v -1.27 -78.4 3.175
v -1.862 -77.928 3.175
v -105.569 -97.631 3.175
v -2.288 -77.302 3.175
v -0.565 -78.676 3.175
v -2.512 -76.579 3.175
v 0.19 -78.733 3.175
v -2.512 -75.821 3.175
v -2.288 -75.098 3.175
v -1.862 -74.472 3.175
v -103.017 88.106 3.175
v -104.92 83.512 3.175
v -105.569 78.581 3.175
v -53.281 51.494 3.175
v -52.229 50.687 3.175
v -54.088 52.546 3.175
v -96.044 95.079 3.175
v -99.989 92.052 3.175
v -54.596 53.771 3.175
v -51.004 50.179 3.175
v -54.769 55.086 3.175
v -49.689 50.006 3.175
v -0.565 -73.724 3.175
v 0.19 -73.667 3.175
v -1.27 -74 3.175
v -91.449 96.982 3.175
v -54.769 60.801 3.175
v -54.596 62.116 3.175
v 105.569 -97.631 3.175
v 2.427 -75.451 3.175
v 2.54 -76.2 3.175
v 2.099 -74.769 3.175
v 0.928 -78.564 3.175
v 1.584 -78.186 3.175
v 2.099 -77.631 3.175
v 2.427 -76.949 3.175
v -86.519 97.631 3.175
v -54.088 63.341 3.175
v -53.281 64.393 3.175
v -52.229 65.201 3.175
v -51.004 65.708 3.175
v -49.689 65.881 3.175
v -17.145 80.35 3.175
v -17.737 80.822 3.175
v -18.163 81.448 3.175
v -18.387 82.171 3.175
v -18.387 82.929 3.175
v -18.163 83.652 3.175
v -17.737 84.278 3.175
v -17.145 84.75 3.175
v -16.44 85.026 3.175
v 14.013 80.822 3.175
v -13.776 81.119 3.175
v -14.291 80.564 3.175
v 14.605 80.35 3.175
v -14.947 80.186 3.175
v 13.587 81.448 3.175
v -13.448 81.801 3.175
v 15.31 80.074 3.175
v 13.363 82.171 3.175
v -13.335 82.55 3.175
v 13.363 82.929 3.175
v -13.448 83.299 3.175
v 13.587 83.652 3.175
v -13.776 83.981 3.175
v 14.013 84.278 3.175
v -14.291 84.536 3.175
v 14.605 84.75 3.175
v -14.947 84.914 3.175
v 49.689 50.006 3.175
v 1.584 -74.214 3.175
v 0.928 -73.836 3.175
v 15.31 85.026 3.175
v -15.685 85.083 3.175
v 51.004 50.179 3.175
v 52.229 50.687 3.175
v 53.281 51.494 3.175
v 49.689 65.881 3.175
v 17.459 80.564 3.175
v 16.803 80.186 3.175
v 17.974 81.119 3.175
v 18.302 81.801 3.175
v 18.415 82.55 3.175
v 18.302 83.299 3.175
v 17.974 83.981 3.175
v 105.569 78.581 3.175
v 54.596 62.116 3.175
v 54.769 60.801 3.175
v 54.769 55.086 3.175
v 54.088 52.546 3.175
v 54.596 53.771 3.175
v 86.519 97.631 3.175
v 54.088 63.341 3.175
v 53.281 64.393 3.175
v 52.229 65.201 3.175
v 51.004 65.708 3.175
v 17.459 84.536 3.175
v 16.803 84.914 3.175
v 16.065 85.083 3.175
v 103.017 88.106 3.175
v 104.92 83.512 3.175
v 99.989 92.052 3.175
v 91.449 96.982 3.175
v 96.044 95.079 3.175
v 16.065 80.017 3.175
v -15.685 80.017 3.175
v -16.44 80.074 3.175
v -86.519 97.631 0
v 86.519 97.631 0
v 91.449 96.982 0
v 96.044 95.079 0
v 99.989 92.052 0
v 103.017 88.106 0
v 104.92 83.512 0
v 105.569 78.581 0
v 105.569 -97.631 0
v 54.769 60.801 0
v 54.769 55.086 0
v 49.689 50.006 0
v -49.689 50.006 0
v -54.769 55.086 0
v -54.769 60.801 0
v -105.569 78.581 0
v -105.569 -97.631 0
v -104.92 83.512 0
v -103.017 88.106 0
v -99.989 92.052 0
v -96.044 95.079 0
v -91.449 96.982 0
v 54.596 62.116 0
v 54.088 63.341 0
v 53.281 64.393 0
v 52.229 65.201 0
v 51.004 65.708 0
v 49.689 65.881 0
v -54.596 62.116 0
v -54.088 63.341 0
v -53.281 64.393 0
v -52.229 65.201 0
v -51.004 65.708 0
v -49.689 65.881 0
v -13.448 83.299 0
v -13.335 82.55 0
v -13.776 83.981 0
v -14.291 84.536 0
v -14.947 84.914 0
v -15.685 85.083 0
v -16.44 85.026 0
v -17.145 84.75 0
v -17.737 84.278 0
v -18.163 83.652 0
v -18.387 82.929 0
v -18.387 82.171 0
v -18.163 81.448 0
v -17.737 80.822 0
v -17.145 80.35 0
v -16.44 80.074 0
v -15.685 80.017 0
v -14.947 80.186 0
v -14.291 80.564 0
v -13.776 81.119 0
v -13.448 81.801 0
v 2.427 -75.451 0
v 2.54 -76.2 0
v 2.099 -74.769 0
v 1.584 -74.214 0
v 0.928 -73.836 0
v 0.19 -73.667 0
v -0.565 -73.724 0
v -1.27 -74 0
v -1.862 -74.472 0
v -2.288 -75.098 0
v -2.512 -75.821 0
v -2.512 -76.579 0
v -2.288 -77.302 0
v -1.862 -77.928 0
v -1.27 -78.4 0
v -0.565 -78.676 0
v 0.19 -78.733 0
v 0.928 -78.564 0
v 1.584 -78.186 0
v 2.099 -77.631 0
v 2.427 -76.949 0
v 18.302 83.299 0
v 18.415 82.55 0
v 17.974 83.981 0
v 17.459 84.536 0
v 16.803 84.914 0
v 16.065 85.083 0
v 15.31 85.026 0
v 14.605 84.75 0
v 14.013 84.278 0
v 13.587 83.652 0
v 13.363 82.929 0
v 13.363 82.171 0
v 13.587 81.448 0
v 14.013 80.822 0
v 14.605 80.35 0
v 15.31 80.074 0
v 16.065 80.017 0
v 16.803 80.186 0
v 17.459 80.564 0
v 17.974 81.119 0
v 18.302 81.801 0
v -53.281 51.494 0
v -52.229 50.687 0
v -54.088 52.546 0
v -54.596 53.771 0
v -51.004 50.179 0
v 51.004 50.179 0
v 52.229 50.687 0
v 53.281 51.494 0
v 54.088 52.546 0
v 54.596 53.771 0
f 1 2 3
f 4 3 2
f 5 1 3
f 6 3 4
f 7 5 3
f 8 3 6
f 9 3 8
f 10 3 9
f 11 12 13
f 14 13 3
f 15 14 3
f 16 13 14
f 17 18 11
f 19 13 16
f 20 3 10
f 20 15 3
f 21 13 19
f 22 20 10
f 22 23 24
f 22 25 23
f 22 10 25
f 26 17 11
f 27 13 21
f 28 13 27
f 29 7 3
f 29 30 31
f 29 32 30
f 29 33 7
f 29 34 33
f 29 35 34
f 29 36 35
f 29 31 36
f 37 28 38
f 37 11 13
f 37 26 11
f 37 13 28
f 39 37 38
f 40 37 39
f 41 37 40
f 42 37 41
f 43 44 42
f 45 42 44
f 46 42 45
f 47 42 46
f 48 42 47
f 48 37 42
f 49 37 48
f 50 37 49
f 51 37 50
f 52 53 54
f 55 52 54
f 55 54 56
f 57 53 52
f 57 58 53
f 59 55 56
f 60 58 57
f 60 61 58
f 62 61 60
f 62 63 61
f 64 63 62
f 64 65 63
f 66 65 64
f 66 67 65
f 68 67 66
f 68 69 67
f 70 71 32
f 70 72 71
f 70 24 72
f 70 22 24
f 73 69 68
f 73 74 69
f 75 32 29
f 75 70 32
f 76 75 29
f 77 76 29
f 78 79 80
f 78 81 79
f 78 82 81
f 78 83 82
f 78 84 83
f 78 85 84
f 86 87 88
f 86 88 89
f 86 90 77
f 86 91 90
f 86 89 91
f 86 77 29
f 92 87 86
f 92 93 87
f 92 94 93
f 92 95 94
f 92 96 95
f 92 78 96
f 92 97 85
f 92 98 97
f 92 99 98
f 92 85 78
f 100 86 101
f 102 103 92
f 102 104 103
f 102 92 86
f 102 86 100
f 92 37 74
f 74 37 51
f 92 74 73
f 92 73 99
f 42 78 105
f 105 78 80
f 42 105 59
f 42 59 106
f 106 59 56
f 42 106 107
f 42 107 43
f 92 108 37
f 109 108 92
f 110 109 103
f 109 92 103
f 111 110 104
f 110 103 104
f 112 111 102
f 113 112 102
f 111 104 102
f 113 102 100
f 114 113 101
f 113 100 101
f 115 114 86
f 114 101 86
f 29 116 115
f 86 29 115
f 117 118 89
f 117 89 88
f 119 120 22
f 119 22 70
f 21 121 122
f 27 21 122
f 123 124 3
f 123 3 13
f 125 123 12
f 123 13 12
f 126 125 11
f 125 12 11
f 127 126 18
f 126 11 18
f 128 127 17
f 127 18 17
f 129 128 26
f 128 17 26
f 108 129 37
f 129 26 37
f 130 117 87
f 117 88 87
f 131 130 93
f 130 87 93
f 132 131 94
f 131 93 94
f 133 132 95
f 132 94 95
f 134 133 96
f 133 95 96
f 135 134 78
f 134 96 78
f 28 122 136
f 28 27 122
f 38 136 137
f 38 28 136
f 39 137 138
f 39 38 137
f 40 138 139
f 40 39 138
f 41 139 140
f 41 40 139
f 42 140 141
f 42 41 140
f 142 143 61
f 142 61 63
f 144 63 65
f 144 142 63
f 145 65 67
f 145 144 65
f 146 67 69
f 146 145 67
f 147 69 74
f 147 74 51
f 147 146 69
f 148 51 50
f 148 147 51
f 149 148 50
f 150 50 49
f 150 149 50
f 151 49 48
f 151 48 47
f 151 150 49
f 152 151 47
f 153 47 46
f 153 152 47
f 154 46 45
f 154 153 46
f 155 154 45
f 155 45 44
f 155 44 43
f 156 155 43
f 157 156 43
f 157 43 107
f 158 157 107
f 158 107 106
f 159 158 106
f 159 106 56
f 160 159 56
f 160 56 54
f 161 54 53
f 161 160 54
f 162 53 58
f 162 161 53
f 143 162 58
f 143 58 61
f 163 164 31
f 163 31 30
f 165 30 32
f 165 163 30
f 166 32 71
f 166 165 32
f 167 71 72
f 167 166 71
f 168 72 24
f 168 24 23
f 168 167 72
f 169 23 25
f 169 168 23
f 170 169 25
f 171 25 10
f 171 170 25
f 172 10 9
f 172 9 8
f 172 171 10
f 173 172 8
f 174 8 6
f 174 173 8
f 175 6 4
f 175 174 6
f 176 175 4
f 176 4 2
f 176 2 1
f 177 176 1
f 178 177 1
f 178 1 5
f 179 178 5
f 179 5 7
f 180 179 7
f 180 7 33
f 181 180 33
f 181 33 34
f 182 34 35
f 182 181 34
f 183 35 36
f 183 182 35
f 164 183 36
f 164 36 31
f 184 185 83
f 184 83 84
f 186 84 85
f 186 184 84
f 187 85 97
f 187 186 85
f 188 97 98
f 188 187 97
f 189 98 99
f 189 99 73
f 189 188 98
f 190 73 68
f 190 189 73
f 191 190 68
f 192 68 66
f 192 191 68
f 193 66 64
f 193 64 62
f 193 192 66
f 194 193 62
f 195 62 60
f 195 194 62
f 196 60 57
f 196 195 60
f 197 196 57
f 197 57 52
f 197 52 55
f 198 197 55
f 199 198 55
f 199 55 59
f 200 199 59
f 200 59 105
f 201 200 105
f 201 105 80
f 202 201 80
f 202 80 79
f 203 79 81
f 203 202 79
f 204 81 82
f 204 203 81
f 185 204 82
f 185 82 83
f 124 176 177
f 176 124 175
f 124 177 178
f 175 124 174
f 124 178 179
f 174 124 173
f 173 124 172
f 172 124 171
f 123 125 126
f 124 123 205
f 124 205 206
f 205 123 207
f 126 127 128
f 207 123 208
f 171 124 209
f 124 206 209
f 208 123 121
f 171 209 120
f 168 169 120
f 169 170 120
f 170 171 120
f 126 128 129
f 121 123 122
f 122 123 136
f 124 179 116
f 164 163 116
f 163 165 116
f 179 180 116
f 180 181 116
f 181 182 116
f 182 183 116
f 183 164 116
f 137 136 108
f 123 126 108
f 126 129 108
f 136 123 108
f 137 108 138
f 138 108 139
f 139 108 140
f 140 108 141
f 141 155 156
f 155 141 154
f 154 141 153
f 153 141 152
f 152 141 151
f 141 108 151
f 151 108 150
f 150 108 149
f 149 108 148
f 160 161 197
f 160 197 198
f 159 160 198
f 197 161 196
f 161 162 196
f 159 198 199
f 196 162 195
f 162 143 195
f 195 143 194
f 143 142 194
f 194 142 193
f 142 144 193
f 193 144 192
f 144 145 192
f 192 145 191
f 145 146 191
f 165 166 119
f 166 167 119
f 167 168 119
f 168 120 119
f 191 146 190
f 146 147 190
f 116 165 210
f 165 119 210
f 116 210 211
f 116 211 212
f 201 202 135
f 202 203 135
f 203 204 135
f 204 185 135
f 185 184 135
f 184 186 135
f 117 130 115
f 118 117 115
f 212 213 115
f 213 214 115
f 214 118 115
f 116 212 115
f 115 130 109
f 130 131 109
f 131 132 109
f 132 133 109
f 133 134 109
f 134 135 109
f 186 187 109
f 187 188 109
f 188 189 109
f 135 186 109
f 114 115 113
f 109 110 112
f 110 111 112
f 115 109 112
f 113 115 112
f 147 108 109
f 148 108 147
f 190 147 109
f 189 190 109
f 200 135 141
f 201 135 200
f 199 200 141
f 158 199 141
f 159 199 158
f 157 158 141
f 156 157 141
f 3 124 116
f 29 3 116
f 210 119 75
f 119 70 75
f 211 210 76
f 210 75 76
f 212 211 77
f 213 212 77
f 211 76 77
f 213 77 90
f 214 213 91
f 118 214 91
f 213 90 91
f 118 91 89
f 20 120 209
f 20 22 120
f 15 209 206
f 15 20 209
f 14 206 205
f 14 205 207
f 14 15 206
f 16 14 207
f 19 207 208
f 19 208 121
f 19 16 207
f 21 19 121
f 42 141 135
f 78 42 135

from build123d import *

# Parameters (mm, degrees)
F0_W     = 211.1375
F0_H     = 195.2625
F0_R     = 2.54
F0_W_2   = 109.5375
F0_H_2   = 15.875
F1_DEPTH = 3.175
F2_R     = 19.05
F3_R     = 5.08


with BuildPart() as f1:
    # F0 (on Top) → F1 (new body)
    with BuildSketch(Plane.XY):
        Rectangle(F0_W, F0_H)
        with Locations((0, -76.2)):
            Circle(F0_R, mode=Mode.SUBTRACT)
        with Locations((-15.875, 82.55)):
            Circle(F0_R, mode=Mode.SUBTRACT)
        with Locations((0, 57.94375)):
            Rectangle(F0_W_2, F0_H_2, mode=Mode.SUBTRACT)
        with Locations((15.875, 82.55)):
            Circle(F0_R, mode=Mode.SUBTRACT)
    extrude(amount=F1_DEPTH)

    # F2
    f2_edges = [f1.edges().sort_by_distance(p)[0] for p in [
        (-105.56875, 97.63125, 1.5875),
        (105.56875, 97.63125, 1.5875),
    ]]
    fillet(f2_edges, radius=F2_R)

    # F3
    f3_edges = [f1.edges().sort_by_distance(p)[0] for p in [
        (-54.76875, 50.00625, 1.5875),
        (-54.76875, 65.88125, 1.5875),
        (54.76875, 50.00625, 1.5875),
        (54.76875, 65.88125, 1.5875),
    ]]
    fillet(f3_edges, radius=F3_R)


solid = f1.part
